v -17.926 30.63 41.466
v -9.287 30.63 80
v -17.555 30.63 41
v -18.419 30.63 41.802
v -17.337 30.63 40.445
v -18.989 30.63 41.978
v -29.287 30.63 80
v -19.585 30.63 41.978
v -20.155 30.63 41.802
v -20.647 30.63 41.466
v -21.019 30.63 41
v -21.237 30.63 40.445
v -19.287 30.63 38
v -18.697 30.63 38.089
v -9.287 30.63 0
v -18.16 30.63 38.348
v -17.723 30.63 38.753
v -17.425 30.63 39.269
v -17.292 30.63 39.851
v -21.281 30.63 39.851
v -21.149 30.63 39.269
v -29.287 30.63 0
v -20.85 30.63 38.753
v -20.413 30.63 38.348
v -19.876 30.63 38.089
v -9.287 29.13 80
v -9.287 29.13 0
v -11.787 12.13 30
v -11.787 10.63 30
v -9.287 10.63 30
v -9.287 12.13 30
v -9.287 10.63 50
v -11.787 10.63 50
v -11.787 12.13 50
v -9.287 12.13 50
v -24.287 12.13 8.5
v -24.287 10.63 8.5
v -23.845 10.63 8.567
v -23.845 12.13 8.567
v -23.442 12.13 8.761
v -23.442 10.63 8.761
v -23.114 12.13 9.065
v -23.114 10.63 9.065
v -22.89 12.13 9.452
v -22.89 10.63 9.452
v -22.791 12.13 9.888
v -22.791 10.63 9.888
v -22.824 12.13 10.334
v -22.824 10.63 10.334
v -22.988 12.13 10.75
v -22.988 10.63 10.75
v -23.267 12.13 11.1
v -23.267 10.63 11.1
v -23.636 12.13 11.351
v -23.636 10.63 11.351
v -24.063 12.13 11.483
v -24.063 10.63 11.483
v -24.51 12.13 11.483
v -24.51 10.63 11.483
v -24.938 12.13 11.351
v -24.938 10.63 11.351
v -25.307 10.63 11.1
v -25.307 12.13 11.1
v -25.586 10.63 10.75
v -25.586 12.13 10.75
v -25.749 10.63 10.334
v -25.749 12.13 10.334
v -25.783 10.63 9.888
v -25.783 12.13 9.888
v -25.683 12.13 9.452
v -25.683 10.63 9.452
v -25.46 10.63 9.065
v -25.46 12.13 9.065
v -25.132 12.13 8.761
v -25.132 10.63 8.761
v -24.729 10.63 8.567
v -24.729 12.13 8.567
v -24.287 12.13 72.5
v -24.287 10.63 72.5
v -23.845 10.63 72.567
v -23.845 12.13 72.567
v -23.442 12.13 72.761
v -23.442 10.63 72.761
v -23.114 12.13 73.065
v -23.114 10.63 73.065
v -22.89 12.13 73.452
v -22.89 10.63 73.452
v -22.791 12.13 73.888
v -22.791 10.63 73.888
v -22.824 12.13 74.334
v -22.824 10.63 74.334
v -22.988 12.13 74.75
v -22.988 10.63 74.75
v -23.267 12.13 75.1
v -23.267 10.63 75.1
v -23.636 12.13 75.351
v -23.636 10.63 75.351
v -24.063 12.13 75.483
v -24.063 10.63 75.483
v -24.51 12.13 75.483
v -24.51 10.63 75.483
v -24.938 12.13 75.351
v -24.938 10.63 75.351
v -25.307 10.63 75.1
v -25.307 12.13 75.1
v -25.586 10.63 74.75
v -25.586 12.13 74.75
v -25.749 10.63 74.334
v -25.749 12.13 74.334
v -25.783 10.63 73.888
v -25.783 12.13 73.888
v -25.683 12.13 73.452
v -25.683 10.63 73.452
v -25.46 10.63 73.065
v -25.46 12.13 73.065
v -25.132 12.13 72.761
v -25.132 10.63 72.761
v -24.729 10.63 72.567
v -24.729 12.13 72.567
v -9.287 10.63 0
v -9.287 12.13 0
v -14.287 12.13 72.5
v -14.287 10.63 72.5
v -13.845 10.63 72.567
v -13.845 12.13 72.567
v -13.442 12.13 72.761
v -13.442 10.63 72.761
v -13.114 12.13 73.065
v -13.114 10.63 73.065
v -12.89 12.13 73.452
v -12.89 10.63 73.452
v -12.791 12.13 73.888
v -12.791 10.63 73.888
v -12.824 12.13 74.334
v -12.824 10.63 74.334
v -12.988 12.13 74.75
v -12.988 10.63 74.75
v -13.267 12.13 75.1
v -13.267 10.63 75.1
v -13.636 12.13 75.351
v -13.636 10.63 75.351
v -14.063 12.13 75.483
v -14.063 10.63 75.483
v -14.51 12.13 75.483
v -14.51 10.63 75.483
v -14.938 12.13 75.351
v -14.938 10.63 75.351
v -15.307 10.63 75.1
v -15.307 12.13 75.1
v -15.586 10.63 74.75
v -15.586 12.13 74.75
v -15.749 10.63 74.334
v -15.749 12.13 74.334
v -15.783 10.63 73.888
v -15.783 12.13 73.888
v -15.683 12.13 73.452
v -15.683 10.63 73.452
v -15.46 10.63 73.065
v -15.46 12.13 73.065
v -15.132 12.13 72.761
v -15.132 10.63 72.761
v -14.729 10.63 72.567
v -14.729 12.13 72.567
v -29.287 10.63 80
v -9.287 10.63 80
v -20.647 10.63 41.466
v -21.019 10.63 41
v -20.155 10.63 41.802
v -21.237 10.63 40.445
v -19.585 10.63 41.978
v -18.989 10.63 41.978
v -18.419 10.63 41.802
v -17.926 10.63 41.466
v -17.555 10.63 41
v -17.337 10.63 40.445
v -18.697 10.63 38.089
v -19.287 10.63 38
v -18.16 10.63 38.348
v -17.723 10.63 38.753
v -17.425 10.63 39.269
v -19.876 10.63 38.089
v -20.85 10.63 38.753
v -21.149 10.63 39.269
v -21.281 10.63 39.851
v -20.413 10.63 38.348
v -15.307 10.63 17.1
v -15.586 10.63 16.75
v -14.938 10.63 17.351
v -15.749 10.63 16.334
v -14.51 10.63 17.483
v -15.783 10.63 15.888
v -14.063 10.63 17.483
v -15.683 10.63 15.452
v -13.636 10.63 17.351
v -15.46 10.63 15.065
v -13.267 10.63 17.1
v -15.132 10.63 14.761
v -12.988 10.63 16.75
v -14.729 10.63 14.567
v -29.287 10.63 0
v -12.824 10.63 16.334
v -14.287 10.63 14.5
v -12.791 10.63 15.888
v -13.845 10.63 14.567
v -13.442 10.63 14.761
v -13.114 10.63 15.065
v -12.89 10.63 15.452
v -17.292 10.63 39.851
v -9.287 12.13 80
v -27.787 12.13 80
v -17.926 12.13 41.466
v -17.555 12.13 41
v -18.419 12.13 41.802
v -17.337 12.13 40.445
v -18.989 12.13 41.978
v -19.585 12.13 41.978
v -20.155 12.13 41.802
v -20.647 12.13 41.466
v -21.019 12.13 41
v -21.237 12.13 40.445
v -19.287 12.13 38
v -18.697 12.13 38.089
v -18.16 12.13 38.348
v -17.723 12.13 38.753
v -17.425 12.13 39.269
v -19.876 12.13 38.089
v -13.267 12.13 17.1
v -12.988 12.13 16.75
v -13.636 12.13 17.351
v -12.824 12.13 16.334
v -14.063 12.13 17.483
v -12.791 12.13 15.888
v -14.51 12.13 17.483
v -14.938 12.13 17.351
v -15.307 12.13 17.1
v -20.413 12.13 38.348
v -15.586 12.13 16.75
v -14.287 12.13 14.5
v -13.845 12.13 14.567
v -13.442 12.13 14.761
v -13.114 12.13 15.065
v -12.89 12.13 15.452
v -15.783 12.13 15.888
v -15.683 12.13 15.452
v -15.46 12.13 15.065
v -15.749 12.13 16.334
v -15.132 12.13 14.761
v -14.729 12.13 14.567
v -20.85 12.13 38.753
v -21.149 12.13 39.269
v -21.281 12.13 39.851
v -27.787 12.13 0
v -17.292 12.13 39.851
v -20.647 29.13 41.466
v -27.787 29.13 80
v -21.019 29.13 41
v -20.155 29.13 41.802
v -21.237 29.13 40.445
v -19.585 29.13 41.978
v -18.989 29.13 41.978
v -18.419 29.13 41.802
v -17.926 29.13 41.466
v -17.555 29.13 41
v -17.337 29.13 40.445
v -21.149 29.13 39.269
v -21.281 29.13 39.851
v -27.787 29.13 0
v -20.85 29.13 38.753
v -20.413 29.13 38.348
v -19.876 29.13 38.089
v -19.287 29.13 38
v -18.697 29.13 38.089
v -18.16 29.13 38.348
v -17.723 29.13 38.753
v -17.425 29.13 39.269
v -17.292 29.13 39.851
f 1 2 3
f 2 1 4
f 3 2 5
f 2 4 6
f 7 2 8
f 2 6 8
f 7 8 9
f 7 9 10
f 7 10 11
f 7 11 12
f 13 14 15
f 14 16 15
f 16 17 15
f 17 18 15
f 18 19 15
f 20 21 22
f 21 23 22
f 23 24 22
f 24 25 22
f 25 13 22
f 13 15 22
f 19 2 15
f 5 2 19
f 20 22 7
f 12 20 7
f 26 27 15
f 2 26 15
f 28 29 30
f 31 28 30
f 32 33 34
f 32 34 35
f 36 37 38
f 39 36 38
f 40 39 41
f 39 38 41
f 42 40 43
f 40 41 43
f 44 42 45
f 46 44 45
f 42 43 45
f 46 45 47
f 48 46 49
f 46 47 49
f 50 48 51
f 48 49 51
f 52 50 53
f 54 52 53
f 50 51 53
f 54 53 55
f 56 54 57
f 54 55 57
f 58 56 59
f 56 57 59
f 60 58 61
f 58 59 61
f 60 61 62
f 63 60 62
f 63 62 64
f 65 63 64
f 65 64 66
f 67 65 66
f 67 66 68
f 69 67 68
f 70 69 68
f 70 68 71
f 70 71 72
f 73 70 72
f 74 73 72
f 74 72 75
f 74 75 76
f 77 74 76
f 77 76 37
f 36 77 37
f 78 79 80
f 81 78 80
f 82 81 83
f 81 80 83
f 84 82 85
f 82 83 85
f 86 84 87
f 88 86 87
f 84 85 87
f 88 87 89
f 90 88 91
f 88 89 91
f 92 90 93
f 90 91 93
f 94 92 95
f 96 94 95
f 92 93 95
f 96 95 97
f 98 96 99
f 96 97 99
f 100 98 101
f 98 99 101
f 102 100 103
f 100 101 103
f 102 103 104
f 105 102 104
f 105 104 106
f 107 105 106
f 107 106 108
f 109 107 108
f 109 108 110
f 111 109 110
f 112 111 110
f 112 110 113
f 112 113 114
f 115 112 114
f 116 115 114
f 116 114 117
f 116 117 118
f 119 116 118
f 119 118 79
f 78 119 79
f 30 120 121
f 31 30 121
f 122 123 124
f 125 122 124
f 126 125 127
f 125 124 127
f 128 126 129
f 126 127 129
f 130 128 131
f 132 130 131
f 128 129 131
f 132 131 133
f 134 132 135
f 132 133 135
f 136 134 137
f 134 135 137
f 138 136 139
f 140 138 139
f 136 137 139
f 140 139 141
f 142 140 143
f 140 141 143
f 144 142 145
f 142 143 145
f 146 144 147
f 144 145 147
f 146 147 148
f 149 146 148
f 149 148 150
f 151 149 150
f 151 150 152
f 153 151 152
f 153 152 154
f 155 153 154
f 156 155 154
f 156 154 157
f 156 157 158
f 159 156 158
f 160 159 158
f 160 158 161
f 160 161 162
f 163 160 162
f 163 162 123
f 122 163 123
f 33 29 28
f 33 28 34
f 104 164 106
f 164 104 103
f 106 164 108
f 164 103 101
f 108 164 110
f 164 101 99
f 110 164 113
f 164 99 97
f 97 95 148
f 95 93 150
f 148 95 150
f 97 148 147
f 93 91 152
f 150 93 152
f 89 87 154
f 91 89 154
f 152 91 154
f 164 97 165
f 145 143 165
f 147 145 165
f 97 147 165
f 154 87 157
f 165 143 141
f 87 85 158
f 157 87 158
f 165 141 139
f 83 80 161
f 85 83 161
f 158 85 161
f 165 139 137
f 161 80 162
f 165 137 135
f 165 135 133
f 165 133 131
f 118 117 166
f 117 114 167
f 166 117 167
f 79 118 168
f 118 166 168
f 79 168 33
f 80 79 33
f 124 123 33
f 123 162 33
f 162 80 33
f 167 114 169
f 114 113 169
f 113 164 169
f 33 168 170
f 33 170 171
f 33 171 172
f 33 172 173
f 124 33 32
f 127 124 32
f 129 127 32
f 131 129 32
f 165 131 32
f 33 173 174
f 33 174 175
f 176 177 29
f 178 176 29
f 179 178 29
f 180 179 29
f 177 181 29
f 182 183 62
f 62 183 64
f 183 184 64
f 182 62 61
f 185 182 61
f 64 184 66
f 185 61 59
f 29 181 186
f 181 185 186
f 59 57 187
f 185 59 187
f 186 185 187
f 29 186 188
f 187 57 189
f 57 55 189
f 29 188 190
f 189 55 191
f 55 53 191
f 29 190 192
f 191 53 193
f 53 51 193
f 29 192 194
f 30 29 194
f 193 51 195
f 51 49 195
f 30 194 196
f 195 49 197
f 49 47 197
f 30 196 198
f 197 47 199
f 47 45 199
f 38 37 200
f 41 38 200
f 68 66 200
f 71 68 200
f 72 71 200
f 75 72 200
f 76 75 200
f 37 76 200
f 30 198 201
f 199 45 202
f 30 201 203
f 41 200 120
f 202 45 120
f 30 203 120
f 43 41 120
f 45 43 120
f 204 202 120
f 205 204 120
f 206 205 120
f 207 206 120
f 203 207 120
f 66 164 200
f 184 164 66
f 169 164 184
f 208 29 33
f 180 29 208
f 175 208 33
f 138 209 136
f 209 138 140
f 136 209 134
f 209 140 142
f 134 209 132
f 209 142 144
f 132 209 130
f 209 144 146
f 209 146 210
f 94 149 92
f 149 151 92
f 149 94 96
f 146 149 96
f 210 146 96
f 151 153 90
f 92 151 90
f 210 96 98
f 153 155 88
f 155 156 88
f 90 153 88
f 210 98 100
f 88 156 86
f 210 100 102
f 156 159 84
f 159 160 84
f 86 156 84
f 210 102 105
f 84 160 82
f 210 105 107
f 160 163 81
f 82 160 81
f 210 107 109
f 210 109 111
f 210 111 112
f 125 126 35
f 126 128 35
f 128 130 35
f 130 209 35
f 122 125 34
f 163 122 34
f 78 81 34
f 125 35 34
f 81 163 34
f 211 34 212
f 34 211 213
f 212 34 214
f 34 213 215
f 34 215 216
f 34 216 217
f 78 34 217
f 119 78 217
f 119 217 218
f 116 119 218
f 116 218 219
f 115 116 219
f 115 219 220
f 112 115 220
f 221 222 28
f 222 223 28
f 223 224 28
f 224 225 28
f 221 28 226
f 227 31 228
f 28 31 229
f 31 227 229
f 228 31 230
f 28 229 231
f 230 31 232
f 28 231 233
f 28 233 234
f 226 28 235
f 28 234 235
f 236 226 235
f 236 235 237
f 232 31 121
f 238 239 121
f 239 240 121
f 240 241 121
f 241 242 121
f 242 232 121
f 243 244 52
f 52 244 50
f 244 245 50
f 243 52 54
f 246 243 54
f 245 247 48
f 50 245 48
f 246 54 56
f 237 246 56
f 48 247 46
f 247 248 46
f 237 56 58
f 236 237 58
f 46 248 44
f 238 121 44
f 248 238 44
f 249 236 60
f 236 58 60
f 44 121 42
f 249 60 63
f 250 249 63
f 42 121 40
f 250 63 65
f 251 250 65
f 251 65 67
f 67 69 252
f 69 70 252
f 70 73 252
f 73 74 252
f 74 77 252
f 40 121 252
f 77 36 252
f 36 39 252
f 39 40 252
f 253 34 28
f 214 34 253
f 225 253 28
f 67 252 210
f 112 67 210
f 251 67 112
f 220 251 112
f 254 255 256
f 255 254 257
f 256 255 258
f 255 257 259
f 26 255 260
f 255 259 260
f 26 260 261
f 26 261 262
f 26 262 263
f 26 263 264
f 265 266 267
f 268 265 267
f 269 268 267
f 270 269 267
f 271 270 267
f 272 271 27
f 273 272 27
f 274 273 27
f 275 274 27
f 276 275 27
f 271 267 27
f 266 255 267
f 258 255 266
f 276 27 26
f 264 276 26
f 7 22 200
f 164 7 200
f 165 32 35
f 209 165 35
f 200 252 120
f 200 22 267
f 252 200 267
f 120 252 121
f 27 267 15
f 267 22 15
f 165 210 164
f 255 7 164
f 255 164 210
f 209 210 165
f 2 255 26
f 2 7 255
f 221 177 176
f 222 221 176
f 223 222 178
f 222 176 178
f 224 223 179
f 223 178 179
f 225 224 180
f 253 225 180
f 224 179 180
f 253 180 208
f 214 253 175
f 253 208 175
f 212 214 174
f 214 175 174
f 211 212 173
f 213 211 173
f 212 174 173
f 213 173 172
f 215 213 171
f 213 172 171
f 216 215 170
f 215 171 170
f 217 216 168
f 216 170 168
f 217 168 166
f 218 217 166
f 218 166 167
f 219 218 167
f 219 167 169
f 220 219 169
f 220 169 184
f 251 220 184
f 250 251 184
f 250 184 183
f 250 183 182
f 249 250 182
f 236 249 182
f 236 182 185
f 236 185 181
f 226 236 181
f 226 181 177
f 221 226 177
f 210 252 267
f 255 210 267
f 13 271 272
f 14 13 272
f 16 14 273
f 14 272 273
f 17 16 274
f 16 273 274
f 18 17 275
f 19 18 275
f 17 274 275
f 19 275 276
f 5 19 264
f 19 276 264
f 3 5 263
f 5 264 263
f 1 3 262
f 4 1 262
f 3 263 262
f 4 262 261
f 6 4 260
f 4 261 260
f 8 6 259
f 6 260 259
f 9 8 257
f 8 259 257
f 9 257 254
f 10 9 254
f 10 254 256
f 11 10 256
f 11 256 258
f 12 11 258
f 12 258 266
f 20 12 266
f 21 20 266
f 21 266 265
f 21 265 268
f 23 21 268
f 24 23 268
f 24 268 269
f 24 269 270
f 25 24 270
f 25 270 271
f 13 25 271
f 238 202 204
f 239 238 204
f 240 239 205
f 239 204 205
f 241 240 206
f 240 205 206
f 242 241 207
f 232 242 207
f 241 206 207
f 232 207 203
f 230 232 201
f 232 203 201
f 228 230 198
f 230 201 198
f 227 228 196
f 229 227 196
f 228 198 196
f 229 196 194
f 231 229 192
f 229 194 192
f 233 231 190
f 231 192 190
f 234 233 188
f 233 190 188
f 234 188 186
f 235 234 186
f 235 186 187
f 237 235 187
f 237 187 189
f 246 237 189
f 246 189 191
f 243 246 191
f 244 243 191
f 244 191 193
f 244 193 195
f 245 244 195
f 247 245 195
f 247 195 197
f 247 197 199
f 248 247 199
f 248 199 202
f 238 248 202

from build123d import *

# Parameters (mm, degrees)
EXTRUSION1_DEPTH = 80
ESQUISSE2_R      = 1.5
ESQUISSE2_W      = 2.5
ESQUISSE2_H      = 20
EXTRUSION2_DEPTH = 10
ESQUISSE3_R      = 2
EXTRUSION3_DEPTH = 88.508383337


with BuildPart() as part:
    # Esquisse1 → Extrusion1 (new body)
    with BuildSketch(Plane.XY):
        Polygon((-29.286808535, 30.629808714), (-29.286808535, 10.629808714), (-9.286808535, 10.629808714), (-9.286808535, 12.129808714), (-27.786808535, 12.129808714), (-27.786808535, 29.129808714), (-9.286808535, 29.129808714), (-9.286808535, 30.629808714), align=None)
    extrude(amount=EXTRUSION1_DEPTH)

    # Esquisse2 → Extrusion2 (cut)
    with BuildSketch(Plane.XZ.offset(-10.629808714)):
        with Locations(Location((-14.286808535, 74, 0), (0, 0, 270))):
            Circle(ESQUISSE2_R)
        with Locations(Location((-24.286808535, 74, 0), (0, 0, 270))):
            Circle(ESQUISSE2_R)
        with Locations(Location((-14.286808535, 16, 0), (0, 0, 270))):
            Circle(ESQUISSE2_R)
        with Locations(Location((-24.286808535, 10, 0), (0, 0, 270))):
            Circle(ESQUISSE2_R)
        with Locations((-10.536808535, 40)):
            Rectangle(ESQUISSE2_W, ESQUISSE2_H)
    extrude(amount=-EXTRUSION2_DEPTH, mode=Mode.SUBTRACT)

    # Esquisse3 → Extrusion3 (cut, through all)
    with BuildSketch(Plane.XZ.offset(-10.629808714)):
        with Locations(Location((-19.286808535, 40, 0), (0, 0, 270))):
            Circle(ESQUISSE3_R)
    extrude(amount=-EXTRUSION3_DEPTH, mode=Mode.SUBTRACT)


solid = part.part
